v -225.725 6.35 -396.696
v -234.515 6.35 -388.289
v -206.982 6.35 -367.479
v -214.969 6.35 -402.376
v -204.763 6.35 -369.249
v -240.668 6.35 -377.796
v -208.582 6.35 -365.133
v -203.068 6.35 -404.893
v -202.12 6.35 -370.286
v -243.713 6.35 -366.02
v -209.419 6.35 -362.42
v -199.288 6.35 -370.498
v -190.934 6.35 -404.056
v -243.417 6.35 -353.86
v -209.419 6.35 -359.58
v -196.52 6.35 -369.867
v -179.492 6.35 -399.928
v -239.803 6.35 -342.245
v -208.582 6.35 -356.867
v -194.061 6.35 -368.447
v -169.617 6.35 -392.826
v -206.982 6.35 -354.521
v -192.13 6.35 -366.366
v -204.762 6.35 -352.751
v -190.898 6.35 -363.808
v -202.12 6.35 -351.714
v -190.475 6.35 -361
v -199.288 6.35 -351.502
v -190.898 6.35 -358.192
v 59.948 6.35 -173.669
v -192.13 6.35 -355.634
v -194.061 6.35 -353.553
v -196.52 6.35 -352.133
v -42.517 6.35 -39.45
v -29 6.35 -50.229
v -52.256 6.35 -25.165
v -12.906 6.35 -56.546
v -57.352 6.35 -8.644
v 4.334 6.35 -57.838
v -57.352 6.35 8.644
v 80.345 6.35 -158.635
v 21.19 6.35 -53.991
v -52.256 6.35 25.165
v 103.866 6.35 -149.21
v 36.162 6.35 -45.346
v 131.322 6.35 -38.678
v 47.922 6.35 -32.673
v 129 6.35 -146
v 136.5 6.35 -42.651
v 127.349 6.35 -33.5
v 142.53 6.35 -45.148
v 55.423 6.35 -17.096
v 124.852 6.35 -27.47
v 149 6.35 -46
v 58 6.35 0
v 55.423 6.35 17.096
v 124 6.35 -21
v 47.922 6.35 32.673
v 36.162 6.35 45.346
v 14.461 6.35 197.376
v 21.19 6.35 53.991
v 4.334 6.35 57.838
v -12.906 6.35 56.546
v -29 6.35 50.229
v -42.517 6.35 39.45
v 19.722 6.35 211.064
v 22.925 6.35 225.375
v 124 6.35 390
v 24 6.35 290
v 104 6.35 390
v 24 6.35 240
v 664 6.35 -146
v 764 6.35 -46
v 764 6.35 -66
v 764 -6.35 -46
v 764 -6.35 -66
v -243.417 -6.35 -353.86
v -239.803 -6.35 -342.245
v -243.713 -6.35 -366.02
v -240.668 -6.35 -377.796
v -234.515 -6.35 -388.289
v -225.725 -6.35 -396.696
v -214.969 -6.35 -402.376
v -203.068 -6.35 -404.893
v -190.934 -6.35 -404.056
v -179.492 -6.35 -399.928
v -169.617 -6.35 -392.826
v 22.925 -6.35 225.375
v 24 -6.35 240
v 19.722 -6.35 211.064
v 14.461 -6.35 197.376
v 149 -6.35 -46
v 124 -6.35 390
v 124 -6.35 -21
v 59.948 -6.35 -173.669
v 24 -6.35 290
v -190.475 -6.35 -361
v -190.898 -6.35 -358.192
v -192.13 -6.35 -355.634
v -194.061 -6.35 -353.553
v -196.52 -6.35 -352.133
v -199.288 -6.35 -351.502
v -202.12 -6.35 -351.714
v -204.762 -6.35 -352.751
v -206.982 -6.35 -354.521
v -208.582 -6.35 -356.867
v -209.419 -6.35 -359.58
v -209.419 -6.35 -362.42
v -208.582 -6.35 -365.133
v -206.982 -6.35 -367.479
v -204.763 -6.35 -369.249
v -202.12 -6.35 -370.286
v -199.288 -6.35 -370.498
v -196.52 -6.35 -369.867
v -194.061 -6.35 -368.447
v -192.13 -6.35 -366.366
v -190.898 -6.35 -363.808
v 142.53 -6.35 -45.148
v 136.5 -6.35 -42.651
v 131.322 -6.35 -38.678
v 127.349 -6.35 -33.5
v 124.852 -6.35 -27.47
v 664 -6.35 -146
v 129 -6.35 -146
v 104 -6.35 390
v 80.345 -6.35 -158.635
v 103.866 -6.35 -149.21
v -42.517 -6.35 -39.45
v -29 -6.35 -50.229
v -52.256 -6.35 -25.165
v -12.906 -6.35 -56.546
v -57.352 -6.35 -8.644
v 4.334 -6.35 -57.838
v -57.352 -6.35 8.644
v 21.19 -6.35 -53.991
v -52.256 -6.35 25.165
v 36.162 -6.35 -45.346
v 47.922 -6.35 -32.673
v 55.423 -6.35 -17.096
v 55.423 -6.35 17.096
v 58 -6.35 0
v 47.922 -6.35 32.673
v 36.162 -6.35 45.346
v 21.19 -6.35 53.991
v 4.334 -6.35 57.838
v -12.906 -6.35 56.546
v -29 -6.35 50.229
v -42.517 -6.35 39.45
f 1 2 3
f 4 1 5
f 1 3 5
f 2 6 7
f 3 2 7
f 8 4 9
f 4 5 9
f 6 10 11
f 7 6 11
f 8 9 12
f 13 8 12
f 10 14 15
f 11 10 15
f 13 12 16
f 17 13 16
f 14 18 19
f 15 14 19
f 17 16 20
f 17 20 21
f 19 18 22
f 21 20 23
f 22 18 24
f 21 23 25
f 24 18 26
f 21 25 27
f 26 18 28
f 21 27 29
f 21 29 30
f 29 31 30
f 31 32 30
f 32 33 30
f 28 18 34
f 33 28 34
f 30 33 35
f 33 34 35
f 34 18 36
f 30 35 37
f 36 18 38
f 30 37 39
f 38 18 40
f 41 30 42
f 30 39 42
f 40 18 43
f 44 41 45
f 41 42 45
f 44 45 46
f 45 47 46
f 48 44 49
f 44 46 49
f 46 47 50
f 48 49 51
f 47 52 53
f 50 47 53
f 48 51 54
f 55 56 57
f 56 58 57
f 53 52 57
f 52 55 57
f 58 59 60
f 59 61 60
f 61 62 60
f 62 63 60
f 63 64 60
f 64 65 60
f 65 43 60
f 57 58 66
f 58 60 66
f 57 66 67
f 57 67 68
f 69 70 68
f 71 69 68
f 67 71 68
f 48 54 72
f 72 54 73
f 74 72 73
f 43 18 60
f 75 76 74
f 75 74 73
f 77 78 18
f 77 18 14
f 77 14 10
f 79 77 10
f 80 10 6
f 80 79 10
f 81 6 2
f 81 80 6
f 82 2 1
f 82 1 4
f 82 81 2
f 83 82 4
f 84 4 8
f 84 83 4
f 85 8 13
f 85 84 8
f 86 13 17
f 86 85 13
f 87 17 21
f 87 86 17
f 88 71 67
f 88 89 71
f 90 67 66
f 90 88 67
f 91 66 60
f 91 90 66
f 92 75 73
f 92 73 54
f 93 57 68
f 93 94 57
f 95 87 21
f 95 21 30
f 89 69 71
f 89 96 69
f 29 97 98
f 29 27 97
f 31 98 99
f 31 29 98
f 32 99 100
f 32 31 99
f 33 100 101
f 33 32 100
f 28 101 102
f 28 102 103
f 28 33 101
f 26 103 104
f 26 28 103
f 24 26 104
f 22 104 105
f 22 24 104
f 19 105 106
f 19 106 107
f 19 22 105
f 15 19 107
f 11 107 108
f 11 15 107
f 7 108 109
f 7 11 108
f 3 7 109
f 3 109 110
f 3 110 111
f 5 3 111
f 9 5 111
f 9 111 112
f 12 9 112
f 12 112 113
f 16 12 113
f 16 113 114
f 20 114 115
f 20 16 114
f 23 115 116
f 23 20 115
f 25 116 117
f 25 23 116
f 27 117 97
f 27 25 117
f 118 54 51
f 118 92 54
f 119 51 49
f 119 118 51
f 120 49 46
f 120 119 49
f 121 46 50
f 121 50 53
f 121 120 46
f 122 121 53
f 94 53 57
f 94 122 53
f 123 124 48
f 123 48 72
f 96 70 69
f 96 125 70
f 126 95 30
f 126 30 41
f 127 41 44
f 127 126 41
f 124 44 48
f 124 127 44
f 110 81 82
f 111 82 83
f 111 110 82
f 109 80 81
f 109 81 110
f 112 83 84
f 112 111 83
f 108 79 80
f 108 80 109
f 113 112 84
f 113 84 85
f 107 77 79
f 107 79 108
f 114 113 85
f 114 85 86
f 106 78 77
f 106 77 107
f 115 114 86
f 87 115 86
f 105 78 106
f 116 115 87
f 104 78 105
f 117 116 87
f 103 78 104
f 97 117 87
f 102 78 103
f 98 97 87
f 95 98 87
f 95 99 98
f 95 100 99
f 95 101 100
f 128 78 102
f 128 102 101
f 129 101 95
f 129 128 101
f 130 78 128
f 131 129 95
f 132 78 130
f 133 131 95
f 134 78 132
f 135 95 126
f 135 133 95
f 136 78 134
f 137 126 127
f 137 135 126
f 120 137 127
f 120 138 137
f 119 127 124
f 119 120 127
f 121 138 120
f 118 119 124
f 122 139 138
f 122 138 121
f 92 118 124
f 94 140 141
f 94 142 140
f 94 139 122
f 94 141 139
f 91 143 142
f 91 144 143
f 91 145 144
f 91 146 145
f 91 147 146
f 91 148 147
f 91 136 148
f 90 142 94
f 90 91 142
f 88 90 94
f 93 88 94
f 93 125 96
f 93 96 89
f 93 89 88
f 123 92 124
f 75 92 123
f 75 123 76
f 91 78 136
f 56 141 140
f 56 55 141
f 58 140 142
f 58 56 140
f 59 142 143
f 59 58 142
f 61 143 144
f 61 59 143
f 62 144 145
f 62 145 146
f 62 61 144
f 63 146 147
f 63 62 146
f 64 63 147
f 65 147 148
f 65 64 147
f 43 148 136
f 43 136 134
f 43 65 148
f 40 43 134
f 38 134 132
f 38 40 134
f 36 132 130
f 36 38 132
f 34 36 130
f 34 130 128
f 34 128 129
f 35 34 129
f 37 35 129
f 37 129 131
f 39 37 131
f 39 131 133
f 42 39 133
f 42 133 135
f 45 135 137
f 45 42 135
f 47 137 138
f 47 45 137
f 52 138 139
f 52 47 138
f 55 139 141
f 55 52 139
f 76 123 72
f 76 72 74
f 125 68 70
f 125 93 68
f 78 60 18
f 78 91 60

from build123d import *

# Parameters (mm, degrees)
F0_R     = 9.525
F0_R_2   = 58
F1_DEPTH = 6.35


# Not quite as in the source:
# - a feature names something its author has since deleted; it is built from what else it names


with BuildPart() as f1:
    # F0 (on Front) → F1 (new body, symmetric)
    with BuildSketch(Plane.XZ):
        with BuildLine():
            Line((14.4609105581, 197.3757855088), (-239.8028006456, -342.2453456239))
            ThreePointArc((-239.8028006456, -342.2453456239), (-225.7250673292, -396.6962310463), (-169.6171250668, -392.8257900262))
            Line((-169.6171250668, -392.8257900262), (59.9480115155, -173.6686590313))
            ThreePointArc((59.9480115155, -173.6686590313), (91.8054714835, -153.1745344831), (129, -146))
            Line((129, -146), (664, -146))
            Line((664, -146), (764, -66))
            Line((764, -66), (764, -46))
            Line((764, -46), (149, -46))
            ThreePointArc((149, -46), (131.3223304703, -38.6776695297), (124, -21))
            Line((124, -21), (124, 390))
            Line((124, 390), (104, 390))
            Line((104, 390), (24, 290))
            Line((24, 290), (24, 240))
            ThreePointArc((24, 240), (21.5860929022, 218.1607126469), (14.4609105581, 197.3757855088))
        make_face()
        with Locations((-200, -361)):
            Circle(F0_R, mode=Mode.SUBTRACT)
        Circle(F0_R_2, mode=Mode.SUBTRACT)
    extrude(amount=F1_DEPTH, both=True)


solid = f1.part
